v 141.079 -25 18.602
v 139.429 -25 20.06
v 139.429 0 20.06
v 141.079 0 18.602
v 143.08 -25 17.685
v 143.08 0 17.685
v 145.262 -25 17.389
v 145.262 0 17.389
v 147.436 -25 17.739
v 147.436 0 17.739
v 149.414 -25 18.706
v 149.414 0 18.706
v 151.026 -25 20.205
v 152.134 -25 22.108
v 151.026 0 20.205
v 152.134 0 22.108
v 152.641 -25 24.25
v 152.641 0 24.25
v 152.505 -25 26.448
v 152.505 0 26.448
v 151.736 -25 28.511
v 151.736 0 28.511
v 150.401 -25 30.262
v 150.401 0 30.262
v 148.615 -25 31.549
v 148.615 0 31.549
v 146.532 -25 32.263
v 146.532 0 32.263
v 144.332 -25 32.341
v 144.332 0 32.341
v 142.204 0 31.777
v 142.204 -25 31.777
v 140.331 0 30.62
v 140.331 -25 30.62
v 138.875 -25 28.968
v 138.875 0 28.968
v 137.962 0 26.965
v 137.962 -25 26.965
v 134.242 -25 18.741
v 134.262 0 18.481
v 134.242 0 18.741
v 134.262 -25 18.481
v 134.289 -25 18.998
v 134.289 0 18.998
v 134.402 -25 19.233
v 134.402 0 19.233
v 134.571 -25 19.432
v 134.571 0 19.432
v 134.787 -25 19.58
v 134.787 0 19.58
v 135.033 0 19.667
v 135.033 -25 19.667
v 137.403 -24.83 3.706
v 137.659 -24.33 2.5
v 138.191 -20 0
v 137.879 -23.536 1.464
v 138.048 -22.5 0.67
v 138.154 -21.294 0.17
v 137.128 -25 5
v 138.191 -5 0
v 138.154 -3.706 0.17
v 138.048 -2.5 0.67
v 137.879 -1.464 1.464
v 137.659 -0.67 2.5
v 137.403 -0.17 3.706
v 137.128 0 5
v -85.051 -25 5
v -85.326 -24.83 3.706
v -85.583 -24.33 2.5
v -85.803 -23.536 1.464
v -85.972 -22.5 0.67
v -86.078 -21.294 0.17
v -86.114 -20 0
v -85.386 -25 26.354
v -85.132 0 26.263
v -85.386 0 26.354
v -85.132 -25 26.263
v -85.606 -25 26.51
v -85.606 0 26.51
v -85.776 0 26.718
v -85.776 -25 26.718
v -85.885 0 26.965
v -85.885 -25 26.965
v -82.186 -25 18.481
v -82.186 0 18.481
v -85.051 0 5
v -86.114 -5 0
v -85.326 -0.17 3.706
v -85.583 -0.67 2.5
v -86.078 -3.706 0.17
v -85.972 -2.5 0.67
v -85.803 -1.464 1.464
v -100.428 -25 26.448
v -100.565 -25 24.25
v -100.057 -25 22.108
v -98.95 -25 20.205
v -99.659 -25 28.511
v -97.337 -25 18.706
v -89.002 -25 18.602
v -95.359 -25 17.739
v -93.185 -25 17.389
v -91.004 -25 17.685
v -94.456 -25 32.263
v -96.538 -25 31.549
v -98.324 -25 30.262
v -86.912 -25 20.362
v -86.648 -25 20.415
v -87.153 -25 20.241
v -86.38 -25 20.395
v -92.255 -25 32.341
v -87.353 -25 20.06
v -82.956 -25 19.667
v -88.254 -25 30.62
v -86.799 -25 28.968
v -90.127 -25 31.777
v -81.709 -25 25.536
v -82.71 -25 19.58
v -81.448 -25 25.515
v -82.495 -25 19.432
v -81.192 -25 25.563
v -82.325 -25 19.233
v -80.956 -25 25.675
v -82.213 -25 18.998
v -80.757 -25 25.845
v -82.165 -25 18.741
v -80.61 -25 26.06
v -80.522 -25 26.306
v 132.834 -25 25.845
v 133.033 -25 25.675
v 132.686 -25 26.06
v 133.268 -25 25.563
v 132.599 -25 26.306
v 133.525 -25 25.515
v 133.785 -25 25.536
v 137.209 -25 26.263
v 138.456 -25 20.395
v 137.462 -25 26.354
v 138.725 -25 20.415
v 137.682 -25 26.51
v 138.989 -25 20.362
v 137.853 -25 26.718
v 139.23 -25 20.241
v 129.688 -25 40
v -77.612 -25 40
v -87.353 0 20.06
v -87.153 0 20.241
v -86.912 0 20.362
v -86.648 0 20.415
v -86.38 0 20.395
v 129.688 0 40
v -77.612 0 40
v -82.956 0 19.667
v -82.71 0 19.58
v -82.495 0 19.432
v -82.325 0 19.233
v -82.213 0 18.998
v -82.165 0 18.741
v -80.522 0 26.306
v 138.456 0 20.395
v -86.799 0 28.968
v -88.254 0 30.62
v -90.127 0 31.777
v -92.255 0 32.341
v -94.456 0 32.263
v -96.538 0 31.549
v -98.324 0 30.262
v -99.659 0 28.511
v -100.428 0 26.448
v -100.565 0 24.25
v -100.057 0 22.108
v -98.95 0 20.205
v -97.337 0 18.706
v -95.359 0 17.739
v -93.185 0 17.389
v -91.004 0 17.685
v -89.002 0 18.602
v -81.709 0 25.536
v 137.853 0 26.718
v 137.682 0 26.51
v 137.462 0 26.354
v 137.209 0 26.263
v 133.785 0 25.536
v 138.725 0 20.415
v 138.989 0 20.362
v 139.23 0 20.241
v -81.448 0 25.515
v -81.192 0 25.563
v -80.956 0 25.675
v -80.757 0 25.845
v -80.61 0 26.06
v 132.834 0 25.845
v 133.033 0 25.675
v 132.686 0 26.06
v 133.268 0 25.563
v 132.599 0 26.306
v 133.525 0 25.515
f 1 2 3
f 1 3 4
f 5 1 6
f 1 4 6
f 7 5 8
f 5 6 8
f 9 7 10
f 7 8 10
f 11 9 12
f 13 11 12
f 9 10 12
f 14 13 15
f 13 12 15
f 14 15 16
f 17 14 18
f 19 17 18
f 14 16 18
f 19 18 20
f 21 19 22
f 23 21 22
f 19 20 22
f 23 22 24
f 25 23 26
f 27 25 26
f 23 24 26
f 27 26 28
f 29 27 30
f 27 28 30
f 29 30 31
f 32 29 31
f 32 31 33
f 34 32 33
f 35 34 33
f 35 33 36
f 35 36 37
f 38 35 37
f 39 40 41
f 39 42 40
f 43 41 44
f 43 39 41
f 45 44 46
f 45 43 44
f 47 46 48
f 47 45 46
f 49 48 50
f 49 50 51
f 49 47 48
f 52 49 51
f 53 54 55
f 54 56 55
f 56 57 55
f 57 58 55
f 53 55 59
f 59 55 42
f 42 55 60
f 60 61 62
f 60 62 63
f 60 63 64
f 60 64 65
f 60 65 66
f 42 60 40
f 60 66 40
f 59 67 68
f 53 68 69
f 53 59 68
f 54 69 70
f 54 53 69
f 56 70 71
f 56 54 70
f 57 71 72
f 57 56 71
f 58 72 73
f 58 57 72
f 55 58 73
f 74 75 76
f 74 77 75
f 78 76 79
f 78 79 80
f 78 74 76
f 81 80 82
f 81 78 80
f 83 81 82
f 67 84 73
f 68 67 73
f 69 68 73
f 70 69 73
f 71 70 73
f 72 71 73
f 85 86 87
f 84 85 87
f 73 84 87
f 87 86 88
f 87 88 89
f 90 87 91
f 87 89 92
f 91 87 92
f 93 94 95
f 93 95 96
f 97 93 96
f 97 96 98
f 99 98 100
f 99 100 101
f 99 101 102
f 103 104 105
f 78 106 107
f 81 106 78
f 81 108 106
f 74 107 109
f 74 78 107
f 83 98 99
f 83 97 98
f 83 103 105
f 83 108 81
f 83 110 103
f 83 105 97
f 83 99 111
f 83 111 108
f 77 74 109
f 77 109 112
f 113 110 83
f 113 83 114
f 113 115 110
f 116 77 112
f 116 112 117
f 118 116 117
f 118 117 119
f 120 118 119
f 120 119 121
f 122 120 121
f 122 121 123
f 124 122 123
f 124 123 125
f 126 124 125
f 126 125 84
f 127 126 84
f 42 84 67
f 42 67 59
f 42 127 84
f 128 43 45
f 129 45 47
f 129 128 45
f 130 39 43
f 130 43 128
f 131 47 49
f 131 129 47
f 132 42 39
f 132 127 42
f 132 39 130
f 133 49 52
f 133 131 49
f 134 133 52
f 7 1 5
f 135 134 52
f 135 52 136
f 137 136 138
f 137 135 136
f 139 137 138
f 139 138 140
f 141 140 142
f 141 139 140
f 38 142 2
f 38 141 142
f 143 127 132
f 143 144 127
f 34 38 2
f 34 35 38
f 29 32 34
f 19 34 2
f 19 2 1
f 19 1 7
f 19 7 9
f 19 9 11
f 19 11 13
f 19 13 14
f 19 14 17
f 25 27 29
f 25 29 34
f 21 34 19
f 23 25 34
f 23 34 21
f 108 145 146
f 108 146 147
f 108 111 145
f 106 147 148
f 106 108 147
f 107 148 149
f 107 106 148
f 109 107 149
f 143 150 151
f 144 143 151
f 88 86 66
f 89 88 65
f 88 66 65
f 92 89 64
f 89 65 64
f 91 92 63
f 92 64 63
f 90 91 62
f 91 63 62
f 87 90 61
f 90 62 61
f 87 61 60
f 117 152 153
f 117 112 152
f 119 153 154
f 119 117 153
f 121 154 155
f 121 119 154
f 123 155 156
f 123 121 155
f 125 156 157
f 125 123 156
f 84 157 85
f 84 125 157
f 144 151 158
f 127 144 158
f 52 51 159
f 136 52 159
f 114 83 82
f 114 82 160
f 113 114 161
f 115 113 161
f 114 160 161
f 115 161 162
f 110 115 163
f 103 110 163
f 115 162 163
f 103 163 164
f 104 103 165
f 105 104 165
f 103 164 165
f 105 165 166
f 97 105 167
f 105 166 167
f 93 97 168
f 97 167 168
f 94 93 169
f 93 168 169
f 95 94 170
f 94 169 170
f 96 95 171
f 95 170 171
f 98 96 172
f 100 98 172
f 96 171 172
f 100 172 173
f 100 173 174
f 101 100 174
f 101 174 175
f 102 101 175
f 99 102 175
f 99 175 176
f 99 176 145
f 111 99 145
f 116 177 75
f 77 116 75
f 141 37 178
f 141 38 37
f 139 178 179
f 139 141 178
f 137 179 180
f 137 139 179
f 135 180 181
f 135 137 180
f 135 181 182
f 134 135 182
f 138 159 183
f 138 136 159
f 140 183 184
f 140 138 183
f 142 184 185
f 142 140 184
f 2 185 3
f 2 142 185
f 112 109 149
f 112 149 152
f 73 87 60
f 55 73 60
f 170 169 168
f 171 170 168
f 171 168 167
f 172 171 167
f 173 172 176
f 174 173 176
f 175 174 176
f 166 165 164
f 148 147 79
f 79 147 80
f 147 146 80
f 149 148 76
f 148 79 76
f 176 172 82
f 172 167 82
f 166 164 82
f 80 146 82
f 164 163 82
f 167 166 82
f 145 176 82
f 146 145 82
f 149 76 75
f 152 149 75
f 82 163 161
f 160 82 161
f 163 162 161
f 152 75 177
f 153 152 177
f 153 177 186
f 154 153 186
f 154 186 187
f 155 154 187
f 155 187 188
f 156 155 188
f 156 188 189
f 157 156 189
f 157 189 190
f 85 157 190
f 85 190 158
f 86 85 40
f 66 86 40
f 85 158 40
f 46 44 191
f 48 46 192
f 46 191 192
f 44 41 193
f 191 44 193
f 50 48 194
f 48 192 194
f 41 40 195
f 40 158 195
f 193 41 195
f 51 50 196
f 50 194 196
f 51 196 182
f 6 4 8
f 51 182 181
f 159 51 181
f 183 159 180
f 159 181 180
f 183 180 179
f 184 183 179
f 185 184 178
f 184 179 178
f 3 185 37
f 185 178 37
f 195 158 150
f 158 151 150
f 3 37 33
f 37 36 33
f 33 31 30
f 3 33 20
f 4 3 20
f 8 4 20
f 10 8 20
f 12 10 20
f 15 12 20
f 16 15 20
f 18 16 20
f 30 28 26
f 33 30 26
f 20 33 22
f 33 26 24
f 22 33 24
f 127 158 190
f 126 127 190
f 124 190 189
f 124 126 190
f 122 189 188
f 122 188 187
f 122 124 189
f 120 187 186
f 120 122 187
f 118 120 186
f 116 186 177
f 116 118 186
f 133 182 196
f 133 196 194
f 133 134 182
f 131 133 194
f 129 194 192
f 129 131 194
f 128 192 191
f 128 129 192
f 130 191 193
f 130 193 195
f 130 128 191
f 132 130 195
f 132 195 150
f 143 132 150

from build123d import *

# Parameters (mm, degrees)
F1_DEPTH = 25
F2_R     = 1
F3_R     = 5


with BuildPart() as f1:
    # F0 (on Front) → F1 (new body)
    with BuildSketch(Plane.XZ):
        with BuildLine():
            Line((129.688292, 40), (-77.611708, 40))
            Line((-77.611708, 40), (-80.730383, 25.327786))
            Line((-80.730383, 25.327786), (-85.744501, 26.39357))
            ThreePointArc((-85.744501, 26.39357), (-100.427997, 26.447621), (-86.991972, 20.524684))
            Line((-86.991972, 20.524684), (-81.977854, 19.4589))
            Line((-81.977854, 19.4589), (-86.11397, 0))
            Line((-86.11397, 0), (138.190554, 0))
            Line((138.190554, 0), (134.054437, 19.4589))
            Line((134.054437, 19.4589), (139.068556, 20.524684))
            ThreePointArc((139.068556, 20.524684), (152.504581, 26.447621), (137.821085, 26.39357))
            Line((137.821085, 26.39357), (132.806967, 25.327786))
            Line((132.806967, 25.327786), (129.688292, 40))
        make_face()
    extrude(amount=F1_DEPTH)

    # F2
    f2_edges = [f1.edges().sort_by_distance(p)[0] for p in [
        (134.054437, -12.5, 19.4589),
        (139.068556, -12.5, 20.524684),
        (132.806967, -12.5, 25.327786),
        (137.821085, -12.5, 26.39357),
        (-85.744501, -12.5, 26.39357),
        (-80.730383, -12.5, 25.327786),
        (-81.977854, -12.5, 19.4589),
        (-86.991972, -12.5, 20.524684),
    ]]
    fillet(f2_edges, radius=F2_R)

    # F3
    f3_edges = [f1.edges().sort_by_distance(p)[0] for p in [
        (26.038292, -25, 0),
        (26.038292, 0, 0),
    ]]
    fillet(f3_edges, radius=F3_R)


solid = f1.part
